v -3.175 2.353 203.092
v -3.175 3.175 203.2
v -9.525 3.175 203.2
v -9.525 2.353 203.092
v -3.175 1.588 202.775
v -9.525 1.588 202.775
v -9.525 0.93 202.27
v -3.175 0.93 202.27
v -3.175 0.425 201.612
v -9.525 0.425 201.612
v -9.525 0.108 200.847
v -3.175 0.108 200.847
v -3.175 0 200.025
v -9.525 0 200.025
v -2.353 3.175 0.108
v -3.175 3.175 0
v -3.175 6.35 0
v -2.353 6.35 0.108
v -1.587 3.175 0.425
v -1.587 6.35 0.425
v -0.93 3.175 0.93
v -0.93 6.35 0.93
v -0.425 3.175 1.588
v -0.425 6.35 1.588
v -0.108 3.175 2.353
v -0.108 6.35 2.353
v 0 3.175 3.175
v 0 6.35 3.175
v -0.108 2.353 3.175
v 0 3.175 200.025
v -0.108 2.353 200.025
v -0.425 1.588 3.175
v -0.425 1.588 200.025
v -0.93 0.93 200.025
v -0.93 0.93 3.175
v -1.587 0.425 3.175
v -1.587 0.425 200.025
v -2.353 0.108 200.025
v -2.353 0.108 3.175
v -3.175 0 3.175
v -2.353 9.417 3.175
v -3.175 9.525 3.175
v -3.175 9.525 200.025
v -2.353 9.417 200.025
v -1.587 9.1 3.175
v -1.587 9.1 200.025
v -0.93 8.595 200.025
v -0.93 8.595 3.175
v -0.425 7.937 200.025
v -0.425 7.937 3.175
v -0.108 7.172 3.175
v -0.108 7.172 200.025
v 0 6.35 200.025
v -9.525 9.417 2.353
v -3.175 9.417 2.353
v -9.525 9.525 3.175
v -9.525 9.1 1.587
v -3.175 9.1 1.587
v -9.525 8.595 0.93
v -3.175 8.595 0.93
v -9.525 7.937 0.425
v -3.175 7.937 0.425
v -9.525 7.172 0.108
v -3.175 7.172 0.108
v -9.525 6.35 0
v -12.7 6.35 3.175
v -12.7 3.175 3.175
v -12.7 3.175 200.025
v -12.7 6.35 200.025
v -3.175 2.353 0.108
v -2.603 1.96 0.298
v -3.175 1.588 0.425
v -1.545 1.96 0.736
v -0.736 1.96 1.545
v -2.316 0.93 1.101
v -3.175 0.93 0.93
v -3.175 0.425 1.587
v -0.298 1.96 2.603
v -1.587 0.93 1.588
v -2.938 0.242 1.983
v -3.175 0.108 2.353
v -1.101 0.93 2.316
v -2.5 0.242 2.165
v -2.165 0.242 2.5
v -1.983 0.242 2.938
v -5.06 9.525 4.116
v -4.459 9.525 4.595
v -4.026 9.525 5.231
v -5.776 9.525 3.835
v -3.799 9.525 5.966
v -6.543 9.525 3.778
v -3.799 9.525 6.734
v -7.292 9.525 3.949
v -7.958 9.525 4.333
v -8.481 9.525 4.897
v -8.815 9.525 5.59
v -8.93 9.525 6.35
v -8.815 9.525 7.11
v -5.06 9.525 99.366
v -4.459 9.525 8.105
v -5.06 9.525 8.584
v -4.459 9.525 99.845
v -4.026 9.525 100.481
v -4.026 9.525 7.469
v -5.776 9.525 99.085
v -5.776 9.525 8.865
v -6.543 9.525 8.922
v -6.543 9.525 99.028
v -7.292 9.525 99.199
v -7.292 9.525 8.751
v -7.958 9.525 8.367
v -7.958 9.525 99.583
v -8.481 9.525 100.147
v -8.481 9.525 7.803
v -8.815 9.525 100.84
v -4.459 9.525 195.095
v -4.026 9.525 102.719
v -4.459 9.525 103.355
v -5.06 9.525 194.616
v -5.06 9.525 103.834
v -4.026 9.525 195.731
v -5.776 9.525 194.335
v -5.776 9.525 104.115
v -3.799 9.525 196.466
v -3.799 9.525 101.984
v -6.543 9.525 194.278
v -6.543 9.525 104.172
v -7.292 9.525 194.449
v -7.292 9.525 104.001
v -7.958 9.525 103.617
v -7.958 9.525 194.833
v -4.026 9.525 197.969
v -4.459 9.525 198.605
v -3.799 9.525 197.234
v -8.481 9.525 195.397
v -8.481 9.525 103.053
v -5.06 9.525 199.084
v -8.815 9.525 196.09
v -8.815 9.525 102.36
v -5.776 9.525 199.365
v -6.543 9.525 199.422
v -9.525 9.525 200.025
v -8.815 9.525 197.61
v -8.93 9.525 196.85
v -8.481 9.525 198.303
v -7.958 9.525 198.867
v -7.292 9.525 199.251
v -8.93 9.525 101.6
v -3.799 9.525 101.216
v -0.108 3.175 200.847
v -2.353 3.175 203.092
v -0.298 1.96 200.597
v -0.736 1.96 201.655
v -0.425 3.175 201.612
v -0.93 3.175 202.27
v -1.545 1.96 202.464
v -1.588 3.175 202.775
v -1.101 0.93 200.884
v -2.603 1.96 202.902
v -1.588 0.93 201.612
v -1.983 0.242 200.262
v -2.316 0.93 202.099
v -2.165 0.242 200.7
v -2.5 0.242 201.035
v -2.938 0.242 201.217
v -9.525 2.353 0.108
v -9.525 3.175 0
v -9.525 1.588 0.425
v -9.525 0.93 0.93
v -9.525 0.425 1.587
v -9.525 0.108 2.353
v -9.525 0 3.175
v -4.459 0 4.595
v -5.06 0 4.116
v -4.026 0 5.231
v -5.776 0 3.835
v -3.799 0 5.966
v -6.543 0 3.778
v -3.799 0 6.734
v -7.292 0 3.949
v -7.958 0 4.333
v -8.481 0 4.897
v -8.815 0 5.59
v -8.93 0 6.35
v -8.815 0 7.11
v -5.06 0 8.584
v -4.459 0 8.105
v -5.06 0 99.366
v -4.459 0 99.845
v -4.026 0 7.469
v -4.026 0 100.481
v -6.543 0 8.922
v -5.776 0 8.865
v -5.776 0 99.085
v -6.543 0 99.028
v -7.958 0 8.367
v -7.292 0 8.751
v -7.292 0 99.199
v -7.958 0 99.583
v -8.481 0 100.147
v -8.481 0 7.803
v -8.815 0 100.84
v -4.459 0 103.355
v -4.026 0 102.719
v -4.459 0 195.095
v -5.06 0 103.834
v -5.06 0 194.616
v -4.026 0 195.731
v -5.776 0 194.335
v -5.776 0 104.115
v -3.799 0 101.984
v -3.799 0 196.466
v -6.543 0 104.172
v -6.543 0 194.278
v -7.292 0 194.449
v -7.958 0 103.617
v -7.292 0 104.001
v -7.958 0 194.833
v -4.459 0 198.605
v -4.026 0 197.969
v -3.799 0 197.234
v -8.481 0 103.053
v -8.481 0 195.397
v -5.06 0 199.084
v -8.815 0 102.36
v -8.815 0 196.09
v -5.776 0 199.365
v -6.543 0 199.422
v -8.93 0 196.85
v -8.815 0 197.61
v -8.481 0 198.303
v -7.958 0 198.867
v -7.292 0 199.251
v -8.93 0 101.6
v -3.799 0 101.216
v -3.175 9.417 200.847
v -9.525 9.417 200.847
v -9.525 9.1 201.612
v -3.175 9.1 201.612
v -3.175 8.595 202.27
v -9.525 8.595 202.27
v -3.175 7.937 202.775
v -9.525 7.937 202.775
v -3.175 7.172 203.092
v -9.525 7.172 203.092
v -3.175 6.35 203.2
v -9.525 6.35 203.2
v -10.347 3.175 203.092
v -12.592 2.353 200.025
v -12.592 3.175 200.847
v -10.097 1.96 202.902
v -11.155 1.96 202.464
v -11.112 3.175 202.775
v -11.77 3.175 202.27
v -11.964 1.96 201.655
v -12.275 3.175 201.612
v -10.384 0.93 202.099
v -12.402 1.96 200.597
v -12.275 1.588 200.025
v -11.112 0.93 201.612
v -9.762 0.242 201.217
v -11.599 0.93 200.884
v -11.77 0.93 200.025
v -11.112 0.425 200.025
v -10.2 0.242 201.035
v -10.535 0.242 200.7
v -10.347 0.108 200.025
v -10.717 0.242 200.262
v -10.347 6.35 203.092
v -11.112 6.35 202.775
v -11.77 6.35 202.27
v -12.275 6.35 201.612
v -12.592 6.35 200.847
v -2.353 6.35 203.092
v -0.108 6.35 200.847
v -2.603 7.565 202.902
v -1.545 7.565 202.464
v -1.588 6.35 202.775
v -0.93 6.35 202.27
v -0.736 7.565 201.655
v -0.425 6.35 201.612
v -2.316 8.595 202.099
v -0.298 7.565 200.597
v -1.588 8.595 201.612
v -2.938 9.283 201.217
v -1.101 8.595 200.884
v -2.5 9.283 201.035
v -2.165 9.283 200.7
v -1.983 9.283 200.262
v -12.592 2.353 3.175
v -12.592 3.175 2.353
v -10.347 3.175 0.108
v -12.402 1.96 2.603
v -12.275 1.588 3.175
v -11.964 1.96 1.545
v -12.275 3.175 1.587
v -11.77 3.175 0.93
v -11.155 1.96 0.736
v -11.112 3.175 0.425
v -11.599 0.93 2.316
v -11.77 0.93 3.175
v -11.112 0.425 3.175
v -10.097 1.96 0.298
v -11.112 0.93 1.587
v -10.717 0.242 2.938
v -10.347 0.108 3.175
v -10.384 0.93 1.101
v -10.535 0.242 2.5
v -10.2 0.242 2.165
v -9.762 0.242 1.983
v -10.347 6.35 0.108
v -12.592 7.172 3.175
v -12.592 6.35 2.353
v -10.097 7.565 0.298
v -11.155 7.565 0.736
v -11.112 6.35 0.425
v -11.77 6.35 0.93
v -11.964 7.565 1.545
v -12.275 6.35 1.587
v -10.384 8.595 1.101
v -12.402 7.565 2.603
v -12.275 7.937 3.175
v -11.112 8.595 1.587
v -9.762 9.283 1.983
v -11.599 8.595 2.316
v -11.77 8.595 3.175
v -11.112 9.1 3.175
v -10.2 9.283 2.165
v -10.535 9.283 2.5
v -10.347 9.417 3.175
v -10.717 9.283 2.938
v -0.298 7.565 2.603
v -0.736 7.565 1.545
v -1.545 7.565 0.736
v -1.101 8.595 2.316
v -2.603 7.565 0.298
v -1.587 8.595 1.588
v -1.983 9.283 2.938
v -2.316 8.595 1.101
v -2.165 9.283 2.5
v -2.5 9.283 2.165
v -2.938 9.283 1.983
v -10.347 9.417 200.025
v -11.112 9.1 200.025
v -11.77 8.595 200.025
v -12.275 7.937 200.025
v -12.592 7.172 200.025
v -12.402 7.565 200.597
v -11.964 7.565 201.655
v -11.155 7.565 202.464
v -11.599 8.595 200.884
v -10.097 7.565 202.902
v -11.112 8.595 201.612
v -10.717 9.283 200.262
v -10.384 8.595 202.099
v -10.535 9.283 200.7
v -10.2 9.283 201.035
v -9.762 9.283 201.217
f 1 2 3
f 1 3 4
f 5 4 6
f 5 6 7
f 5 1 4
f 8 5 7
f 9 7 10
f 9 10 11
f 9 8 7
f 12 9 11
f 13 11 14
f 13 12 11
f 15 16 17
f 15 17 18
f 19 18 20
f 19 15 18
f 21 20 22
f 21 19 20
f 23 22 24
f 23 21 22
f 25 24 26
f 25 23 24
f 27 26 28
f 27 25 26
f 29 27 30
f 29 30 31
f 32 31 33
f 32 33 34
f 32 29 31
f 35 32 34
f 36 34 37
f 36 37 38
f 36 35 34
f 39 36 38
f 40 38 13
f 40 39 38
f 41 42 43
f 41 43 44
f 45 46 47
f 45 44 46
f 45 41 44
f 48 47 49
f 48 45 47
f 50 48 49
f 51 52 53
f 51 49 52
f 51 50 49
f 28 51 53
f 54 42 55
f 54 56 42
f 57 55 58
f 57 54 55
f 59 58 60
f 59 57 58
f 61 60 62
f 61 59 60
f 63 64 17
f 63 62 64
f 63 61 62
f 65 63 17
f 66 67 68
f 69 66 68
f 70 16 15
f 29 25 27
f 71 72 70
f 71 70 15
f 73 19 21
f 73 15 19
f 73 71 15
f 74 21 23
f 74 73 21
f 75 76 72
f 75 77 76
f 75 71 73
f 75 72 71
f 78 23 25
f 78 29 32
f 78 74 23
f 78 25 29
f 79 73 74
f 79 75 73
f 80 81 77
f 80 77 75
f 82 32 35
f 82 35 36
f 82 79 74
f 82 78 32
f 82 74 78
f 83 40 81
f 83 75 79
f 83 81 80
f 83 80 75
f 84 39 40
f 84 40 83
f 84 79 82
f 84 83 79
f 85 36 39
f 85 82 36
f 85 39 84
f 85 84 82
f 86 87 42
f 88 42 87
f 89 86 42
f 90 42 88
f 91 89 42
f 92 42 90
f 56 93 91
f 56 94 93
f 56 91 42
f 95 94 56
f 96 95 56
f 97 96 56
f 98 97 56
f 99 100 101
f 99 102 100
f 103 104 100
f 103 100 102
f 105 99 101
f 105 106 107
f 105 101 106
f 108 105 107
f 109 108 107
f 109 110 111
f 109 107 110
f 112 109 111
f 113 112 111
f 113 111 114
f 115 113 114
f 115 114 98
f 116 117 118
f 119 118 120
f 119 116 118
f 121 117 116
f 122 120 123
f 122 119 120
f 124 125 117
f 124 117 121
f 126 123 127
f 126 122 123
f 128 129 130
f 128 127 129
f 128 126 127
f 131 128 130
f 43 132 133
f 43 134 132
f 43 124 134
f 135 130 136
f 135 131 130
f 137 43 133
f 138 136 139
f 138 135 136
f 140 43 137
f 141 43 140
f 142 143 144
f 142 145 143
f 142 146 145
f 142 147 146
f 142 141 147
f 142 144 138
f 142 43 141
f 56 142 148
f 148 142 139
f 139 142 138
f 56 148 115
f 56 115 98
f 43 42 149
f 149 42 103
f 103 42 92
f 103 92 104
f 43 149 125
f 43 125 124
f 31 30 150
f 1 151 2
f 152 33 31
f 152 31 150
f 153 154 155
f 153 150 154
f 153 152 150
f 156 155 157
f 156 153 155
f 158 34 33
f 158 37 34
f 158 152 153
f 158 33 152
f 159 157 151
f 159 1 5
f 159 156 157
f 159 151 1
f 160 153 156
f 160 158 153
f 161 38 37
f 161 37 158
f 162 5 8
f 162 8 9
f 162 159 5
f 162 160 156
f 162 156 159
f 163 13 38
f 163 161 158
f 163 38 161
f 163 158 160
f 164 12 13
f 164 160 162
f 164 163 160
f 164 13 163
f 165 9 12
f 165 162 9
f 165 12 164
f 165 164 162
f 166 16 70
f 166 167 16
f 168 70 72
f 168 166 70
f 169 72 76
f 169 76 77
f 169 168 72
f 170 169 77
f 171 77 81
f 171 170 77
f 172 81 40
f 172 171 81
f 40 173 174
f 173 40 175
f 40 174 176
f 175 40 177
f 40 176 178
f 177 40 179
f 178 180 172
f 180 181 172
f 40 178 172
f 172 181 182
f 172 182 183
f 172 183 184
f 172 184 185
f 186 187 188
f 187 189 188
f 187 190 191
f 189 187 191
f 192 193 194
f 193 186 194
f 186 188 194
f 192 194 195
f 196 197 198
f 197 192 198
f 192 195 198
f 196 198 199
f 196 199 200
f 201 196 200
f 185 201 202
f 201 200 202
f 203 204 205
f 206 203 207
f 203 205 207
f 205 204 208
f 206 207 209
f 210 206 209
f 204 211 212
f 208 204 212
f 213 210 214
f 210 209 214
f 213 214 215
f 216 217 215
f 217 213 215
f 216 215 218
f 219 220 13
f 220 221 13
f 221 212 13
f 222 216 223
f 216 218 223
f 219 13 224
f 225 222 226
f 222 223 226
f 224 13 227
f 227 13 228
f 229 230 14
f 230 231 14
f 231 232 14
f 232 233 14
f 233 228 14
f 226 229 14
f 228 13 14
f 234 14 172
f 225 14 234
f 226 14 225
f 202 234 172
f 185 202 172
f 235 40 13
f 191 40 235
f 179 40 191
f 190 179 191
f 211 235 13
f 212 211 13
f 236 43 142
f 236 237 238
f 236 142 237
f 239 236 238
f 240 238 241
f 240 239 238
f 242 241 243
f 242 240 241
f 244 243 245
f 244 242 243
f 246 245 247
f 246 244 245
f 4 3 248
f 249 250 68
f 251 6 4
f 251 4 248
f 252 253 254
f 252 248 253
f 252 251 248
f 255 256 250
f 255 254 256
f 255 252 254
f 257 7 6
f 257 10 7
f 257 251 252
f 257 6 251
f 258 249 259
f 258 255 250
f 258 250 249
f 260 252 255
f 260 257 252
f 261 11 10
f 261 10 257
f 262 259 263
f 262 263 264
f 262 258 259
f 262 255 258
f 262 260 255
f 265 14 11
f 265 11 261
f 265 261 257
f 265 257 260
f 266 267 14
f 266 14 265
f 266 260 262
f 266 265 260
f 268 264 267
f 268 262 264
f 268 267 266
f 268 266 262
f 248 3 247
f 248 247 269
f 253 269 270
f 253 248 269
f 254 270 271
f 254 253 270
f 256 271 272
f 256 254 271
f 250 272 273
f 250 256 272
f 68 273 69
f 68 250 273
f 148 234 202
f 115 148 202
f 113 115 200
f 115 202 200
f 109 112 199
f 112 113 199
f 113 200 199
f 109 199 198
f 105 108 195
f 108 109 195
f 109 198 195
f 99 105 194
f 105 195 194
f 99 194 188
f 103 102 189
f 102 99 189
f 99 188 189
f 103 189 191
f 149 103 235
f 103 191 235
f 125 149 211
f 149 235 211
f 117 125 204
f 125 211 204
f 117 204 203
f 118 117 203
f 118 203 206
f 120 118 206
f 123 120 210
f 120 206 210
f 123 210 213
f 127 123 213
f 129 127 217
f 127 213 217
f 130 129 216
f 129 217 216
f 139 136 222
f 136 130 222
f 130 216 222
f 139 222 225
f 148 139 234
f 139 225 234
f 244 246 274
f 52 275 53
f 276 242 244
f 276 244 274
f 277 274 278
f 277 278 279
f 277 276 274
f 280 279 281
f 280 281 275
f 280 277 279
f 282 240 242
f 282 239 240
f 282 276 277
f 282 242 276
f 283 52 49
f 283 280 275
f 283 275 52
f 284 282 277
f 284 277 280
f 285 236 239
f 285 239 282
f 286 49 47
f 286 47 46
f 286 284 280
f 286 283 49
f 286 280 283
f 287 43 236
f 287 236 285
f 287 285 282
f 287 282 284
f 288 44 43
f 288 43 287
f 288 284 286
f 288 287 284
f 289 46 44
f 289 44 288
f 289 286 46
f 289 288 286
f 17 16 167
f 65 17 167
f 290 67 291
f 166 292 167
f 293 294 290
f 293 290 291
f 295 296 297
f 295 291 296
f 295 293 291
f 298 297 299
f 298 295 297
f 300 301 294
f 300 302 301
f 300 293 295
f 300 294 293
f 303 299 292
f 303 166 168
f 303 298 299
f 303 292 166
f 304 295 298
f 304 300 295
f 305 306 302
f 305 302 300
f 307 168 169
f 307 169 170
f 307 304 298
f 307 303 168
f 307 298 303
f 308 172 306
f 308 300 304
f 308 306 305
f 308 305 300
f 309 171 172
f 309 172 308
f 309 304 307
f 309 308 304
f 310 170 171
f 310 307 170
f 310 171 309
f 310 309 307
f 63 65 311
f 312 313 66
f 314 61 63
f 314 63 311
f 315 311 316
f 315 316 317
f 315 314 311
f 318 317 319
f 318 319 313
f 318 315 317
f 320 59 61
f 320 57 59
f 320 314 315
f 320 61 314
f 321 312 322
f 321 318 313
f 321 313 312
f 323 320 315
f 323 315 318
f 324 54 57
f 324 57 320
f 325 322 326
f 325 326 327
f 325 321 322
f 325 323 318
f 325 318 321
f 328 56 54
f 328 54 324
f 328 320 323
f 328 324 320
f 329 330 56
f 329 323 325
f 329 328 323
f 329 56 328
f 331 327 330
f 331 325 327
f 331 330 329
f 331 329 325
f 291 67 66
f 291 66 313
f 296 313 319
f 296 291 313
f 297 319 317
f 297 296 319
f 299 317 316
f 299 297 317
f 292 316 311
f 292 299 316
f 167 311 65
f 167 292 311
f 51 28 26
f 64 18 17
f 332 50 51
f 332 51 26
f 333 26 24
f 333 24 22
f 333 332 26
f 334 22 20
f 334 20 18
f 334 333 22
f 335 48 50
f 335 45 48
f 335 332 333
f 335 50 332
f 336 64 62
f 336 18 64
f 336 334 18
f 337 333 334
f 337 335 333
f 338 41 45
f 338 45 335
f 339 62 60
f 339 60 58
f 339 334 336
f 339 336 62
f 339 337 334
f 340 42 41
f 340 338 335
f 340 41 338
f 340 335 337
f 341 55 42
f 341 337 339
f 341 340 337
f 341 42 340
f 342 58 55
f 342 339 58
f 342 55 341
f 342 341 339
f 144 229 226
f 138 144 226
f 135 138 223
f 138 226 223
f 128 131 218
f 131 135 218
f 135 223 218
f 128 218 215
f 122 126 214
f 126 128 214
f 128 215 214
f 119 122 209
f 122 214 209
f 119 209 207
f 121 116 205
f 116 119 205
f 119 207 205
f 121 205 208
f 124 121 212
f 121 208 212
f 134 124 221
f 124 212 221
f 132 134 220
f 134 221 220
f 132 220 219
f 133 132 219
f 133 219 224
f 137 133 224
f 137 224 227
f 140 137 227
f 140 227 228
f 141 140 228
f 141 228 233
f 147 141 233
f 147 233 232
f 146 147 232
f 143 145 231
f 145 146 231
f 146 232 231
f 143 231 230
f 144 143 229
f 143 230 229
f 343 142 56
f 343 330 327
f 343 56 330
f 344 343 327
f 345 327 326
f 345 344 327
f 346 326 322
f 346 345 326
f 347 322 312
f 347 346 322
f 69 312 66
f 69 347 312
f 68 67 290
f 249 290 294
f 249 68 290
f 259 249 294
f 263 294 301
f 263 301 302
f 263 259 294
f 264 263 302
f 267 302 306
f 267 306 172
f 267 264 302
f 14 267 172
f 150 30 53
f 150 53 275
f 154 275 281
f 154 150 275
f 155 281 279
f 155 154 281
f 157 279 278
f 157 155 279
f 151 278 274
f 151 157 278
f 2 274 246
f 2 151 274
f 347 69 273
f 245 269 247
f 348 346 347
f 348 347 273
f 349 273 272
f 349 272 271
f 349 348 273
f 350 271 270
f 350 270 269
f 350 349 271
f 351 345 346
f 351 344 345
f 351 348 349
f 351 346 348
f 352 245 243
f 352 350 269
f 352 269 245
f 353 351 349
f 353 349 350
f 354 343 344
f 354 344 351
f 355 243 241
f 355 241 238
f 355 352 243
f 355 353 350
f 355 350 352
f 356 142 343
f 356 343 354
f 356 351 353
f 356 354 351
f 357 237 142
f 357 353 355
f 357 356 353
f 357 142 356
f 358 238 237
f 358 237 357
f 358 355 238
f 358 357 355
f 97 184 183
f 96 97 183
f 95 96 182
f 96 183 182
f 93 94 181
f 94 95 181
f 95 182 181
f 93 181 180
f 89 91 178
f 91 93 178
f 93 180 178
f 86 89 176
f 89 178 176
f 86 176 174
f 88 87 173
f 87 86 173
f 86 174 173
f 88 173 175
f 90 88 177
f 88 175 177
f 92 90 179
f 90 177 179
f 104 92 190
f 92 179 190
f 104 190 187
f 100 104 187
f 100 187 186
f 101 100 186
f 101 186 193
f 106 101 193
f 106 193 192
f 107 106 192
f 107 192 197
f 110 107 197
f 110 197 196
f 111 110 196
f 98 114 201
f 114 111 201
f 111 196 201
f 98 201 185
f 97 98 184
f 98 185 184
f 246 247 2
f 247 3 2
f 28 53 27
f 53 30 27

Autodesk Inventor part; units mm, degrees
ref_plane "YZ Plane" through (0, 0, 0) normal (1, 0, 0) x (0, 1, 0)
ref_plane "XZ Plane" through (0, 0, 0) normal (0, 1, 0) x (-1, 0, 0)
ref_plane "XY Plane" through (0, 0, 0) normal (0, 0, 1) x (1, 0, 0)
sketch "Sketch1" plane through (0, 0, 0) normal (0, 1, 0) x (-1, 0, 0)
  line L0 (3.175, 0) -> (9.525, 0)
  line L1 (12.7, 3.175) -> (12.7, 200.025)
  line L2 (9.525, 203.2) -> (3.175, 203.2)
  line L3 (0, 200.025) -> (0, 3.175)
  circle A0 centre (6.35, 6.35) radius 2.5797
  circle A1 centre (6.35, 196.85) radius 2.5797
  circle A2 centre (6.35, 101.6) radius 2.5797
  arc A3 (12.7, 200.025) -> (9.525, 203.2) centre (9.525, 200.025) ccw
  arc A4 (3.175, 203.2) -> (0, 200.025) centre (3.175, 200.025) ccw
  arc A5 (0, 3.175) -> (3.175, 0) centre (3.175, 3.175) ccw
  arc A6 (9.525, 0) -> (12.7, 3.175) centre (9.525, 3.175) ccw
  point P0 (0, 0)
  point P1 (12.7, 0)
  point P2 (0, 203.2)
  dimension "d0" = 203.2
  dimension "d1" = 12.7
  dimension "d2" = 5.1594
  dimension "d3" = 6.35
  dimension "d4" = 6.35
  dimension "d5" = 5.1594
  dimension "d6" = 6.35
  dimension "d7" = 6.35
  dimension "d8" = 6.35
  dimension "d9" = 5.1594
  dimension "d10" = 101.6
  dimension "d11" = 3.175
extrude "Extrusion1" add sketch "Sketch1" along normal blind 9.525
fillet "Fillet1" radius 3.175 16 edges at (-0.9299, 9.525, 0.9299) (-6.35, 9.525, 0) (-11.7701, 9.525, 0.9299) (-12.7, 9.525, 101.6) (-11.7701, 9.525, 202.2701) (-6.35, 9.525, 203.2) (-0.9299, 9.525, 202.2701) (0, 9.525, 101.6) (-0.9299, 0, 0.9299) (-6.35, 0, 0) (-11.7701, 0, 0.9299) (-12.7, 0, 101.6) (-11.7701, 0, 202.2701) (-6.35, 0, 203.2) (-0.9299, 0, 202.2701) (0, 0, 101.6)
equation "\"d3\" = 0.5 * d1"
equation "\"d4\" = d3"
equation "\"d5\" = d2"
equation "\"d6\" = d4"
equation "\"d7\" = d6"
equation "\"d8\" = d7"
equation "\"d9\" = d5"
equation "\"d10\" = 0.5 * d0"
properties part number "Outer bar"
